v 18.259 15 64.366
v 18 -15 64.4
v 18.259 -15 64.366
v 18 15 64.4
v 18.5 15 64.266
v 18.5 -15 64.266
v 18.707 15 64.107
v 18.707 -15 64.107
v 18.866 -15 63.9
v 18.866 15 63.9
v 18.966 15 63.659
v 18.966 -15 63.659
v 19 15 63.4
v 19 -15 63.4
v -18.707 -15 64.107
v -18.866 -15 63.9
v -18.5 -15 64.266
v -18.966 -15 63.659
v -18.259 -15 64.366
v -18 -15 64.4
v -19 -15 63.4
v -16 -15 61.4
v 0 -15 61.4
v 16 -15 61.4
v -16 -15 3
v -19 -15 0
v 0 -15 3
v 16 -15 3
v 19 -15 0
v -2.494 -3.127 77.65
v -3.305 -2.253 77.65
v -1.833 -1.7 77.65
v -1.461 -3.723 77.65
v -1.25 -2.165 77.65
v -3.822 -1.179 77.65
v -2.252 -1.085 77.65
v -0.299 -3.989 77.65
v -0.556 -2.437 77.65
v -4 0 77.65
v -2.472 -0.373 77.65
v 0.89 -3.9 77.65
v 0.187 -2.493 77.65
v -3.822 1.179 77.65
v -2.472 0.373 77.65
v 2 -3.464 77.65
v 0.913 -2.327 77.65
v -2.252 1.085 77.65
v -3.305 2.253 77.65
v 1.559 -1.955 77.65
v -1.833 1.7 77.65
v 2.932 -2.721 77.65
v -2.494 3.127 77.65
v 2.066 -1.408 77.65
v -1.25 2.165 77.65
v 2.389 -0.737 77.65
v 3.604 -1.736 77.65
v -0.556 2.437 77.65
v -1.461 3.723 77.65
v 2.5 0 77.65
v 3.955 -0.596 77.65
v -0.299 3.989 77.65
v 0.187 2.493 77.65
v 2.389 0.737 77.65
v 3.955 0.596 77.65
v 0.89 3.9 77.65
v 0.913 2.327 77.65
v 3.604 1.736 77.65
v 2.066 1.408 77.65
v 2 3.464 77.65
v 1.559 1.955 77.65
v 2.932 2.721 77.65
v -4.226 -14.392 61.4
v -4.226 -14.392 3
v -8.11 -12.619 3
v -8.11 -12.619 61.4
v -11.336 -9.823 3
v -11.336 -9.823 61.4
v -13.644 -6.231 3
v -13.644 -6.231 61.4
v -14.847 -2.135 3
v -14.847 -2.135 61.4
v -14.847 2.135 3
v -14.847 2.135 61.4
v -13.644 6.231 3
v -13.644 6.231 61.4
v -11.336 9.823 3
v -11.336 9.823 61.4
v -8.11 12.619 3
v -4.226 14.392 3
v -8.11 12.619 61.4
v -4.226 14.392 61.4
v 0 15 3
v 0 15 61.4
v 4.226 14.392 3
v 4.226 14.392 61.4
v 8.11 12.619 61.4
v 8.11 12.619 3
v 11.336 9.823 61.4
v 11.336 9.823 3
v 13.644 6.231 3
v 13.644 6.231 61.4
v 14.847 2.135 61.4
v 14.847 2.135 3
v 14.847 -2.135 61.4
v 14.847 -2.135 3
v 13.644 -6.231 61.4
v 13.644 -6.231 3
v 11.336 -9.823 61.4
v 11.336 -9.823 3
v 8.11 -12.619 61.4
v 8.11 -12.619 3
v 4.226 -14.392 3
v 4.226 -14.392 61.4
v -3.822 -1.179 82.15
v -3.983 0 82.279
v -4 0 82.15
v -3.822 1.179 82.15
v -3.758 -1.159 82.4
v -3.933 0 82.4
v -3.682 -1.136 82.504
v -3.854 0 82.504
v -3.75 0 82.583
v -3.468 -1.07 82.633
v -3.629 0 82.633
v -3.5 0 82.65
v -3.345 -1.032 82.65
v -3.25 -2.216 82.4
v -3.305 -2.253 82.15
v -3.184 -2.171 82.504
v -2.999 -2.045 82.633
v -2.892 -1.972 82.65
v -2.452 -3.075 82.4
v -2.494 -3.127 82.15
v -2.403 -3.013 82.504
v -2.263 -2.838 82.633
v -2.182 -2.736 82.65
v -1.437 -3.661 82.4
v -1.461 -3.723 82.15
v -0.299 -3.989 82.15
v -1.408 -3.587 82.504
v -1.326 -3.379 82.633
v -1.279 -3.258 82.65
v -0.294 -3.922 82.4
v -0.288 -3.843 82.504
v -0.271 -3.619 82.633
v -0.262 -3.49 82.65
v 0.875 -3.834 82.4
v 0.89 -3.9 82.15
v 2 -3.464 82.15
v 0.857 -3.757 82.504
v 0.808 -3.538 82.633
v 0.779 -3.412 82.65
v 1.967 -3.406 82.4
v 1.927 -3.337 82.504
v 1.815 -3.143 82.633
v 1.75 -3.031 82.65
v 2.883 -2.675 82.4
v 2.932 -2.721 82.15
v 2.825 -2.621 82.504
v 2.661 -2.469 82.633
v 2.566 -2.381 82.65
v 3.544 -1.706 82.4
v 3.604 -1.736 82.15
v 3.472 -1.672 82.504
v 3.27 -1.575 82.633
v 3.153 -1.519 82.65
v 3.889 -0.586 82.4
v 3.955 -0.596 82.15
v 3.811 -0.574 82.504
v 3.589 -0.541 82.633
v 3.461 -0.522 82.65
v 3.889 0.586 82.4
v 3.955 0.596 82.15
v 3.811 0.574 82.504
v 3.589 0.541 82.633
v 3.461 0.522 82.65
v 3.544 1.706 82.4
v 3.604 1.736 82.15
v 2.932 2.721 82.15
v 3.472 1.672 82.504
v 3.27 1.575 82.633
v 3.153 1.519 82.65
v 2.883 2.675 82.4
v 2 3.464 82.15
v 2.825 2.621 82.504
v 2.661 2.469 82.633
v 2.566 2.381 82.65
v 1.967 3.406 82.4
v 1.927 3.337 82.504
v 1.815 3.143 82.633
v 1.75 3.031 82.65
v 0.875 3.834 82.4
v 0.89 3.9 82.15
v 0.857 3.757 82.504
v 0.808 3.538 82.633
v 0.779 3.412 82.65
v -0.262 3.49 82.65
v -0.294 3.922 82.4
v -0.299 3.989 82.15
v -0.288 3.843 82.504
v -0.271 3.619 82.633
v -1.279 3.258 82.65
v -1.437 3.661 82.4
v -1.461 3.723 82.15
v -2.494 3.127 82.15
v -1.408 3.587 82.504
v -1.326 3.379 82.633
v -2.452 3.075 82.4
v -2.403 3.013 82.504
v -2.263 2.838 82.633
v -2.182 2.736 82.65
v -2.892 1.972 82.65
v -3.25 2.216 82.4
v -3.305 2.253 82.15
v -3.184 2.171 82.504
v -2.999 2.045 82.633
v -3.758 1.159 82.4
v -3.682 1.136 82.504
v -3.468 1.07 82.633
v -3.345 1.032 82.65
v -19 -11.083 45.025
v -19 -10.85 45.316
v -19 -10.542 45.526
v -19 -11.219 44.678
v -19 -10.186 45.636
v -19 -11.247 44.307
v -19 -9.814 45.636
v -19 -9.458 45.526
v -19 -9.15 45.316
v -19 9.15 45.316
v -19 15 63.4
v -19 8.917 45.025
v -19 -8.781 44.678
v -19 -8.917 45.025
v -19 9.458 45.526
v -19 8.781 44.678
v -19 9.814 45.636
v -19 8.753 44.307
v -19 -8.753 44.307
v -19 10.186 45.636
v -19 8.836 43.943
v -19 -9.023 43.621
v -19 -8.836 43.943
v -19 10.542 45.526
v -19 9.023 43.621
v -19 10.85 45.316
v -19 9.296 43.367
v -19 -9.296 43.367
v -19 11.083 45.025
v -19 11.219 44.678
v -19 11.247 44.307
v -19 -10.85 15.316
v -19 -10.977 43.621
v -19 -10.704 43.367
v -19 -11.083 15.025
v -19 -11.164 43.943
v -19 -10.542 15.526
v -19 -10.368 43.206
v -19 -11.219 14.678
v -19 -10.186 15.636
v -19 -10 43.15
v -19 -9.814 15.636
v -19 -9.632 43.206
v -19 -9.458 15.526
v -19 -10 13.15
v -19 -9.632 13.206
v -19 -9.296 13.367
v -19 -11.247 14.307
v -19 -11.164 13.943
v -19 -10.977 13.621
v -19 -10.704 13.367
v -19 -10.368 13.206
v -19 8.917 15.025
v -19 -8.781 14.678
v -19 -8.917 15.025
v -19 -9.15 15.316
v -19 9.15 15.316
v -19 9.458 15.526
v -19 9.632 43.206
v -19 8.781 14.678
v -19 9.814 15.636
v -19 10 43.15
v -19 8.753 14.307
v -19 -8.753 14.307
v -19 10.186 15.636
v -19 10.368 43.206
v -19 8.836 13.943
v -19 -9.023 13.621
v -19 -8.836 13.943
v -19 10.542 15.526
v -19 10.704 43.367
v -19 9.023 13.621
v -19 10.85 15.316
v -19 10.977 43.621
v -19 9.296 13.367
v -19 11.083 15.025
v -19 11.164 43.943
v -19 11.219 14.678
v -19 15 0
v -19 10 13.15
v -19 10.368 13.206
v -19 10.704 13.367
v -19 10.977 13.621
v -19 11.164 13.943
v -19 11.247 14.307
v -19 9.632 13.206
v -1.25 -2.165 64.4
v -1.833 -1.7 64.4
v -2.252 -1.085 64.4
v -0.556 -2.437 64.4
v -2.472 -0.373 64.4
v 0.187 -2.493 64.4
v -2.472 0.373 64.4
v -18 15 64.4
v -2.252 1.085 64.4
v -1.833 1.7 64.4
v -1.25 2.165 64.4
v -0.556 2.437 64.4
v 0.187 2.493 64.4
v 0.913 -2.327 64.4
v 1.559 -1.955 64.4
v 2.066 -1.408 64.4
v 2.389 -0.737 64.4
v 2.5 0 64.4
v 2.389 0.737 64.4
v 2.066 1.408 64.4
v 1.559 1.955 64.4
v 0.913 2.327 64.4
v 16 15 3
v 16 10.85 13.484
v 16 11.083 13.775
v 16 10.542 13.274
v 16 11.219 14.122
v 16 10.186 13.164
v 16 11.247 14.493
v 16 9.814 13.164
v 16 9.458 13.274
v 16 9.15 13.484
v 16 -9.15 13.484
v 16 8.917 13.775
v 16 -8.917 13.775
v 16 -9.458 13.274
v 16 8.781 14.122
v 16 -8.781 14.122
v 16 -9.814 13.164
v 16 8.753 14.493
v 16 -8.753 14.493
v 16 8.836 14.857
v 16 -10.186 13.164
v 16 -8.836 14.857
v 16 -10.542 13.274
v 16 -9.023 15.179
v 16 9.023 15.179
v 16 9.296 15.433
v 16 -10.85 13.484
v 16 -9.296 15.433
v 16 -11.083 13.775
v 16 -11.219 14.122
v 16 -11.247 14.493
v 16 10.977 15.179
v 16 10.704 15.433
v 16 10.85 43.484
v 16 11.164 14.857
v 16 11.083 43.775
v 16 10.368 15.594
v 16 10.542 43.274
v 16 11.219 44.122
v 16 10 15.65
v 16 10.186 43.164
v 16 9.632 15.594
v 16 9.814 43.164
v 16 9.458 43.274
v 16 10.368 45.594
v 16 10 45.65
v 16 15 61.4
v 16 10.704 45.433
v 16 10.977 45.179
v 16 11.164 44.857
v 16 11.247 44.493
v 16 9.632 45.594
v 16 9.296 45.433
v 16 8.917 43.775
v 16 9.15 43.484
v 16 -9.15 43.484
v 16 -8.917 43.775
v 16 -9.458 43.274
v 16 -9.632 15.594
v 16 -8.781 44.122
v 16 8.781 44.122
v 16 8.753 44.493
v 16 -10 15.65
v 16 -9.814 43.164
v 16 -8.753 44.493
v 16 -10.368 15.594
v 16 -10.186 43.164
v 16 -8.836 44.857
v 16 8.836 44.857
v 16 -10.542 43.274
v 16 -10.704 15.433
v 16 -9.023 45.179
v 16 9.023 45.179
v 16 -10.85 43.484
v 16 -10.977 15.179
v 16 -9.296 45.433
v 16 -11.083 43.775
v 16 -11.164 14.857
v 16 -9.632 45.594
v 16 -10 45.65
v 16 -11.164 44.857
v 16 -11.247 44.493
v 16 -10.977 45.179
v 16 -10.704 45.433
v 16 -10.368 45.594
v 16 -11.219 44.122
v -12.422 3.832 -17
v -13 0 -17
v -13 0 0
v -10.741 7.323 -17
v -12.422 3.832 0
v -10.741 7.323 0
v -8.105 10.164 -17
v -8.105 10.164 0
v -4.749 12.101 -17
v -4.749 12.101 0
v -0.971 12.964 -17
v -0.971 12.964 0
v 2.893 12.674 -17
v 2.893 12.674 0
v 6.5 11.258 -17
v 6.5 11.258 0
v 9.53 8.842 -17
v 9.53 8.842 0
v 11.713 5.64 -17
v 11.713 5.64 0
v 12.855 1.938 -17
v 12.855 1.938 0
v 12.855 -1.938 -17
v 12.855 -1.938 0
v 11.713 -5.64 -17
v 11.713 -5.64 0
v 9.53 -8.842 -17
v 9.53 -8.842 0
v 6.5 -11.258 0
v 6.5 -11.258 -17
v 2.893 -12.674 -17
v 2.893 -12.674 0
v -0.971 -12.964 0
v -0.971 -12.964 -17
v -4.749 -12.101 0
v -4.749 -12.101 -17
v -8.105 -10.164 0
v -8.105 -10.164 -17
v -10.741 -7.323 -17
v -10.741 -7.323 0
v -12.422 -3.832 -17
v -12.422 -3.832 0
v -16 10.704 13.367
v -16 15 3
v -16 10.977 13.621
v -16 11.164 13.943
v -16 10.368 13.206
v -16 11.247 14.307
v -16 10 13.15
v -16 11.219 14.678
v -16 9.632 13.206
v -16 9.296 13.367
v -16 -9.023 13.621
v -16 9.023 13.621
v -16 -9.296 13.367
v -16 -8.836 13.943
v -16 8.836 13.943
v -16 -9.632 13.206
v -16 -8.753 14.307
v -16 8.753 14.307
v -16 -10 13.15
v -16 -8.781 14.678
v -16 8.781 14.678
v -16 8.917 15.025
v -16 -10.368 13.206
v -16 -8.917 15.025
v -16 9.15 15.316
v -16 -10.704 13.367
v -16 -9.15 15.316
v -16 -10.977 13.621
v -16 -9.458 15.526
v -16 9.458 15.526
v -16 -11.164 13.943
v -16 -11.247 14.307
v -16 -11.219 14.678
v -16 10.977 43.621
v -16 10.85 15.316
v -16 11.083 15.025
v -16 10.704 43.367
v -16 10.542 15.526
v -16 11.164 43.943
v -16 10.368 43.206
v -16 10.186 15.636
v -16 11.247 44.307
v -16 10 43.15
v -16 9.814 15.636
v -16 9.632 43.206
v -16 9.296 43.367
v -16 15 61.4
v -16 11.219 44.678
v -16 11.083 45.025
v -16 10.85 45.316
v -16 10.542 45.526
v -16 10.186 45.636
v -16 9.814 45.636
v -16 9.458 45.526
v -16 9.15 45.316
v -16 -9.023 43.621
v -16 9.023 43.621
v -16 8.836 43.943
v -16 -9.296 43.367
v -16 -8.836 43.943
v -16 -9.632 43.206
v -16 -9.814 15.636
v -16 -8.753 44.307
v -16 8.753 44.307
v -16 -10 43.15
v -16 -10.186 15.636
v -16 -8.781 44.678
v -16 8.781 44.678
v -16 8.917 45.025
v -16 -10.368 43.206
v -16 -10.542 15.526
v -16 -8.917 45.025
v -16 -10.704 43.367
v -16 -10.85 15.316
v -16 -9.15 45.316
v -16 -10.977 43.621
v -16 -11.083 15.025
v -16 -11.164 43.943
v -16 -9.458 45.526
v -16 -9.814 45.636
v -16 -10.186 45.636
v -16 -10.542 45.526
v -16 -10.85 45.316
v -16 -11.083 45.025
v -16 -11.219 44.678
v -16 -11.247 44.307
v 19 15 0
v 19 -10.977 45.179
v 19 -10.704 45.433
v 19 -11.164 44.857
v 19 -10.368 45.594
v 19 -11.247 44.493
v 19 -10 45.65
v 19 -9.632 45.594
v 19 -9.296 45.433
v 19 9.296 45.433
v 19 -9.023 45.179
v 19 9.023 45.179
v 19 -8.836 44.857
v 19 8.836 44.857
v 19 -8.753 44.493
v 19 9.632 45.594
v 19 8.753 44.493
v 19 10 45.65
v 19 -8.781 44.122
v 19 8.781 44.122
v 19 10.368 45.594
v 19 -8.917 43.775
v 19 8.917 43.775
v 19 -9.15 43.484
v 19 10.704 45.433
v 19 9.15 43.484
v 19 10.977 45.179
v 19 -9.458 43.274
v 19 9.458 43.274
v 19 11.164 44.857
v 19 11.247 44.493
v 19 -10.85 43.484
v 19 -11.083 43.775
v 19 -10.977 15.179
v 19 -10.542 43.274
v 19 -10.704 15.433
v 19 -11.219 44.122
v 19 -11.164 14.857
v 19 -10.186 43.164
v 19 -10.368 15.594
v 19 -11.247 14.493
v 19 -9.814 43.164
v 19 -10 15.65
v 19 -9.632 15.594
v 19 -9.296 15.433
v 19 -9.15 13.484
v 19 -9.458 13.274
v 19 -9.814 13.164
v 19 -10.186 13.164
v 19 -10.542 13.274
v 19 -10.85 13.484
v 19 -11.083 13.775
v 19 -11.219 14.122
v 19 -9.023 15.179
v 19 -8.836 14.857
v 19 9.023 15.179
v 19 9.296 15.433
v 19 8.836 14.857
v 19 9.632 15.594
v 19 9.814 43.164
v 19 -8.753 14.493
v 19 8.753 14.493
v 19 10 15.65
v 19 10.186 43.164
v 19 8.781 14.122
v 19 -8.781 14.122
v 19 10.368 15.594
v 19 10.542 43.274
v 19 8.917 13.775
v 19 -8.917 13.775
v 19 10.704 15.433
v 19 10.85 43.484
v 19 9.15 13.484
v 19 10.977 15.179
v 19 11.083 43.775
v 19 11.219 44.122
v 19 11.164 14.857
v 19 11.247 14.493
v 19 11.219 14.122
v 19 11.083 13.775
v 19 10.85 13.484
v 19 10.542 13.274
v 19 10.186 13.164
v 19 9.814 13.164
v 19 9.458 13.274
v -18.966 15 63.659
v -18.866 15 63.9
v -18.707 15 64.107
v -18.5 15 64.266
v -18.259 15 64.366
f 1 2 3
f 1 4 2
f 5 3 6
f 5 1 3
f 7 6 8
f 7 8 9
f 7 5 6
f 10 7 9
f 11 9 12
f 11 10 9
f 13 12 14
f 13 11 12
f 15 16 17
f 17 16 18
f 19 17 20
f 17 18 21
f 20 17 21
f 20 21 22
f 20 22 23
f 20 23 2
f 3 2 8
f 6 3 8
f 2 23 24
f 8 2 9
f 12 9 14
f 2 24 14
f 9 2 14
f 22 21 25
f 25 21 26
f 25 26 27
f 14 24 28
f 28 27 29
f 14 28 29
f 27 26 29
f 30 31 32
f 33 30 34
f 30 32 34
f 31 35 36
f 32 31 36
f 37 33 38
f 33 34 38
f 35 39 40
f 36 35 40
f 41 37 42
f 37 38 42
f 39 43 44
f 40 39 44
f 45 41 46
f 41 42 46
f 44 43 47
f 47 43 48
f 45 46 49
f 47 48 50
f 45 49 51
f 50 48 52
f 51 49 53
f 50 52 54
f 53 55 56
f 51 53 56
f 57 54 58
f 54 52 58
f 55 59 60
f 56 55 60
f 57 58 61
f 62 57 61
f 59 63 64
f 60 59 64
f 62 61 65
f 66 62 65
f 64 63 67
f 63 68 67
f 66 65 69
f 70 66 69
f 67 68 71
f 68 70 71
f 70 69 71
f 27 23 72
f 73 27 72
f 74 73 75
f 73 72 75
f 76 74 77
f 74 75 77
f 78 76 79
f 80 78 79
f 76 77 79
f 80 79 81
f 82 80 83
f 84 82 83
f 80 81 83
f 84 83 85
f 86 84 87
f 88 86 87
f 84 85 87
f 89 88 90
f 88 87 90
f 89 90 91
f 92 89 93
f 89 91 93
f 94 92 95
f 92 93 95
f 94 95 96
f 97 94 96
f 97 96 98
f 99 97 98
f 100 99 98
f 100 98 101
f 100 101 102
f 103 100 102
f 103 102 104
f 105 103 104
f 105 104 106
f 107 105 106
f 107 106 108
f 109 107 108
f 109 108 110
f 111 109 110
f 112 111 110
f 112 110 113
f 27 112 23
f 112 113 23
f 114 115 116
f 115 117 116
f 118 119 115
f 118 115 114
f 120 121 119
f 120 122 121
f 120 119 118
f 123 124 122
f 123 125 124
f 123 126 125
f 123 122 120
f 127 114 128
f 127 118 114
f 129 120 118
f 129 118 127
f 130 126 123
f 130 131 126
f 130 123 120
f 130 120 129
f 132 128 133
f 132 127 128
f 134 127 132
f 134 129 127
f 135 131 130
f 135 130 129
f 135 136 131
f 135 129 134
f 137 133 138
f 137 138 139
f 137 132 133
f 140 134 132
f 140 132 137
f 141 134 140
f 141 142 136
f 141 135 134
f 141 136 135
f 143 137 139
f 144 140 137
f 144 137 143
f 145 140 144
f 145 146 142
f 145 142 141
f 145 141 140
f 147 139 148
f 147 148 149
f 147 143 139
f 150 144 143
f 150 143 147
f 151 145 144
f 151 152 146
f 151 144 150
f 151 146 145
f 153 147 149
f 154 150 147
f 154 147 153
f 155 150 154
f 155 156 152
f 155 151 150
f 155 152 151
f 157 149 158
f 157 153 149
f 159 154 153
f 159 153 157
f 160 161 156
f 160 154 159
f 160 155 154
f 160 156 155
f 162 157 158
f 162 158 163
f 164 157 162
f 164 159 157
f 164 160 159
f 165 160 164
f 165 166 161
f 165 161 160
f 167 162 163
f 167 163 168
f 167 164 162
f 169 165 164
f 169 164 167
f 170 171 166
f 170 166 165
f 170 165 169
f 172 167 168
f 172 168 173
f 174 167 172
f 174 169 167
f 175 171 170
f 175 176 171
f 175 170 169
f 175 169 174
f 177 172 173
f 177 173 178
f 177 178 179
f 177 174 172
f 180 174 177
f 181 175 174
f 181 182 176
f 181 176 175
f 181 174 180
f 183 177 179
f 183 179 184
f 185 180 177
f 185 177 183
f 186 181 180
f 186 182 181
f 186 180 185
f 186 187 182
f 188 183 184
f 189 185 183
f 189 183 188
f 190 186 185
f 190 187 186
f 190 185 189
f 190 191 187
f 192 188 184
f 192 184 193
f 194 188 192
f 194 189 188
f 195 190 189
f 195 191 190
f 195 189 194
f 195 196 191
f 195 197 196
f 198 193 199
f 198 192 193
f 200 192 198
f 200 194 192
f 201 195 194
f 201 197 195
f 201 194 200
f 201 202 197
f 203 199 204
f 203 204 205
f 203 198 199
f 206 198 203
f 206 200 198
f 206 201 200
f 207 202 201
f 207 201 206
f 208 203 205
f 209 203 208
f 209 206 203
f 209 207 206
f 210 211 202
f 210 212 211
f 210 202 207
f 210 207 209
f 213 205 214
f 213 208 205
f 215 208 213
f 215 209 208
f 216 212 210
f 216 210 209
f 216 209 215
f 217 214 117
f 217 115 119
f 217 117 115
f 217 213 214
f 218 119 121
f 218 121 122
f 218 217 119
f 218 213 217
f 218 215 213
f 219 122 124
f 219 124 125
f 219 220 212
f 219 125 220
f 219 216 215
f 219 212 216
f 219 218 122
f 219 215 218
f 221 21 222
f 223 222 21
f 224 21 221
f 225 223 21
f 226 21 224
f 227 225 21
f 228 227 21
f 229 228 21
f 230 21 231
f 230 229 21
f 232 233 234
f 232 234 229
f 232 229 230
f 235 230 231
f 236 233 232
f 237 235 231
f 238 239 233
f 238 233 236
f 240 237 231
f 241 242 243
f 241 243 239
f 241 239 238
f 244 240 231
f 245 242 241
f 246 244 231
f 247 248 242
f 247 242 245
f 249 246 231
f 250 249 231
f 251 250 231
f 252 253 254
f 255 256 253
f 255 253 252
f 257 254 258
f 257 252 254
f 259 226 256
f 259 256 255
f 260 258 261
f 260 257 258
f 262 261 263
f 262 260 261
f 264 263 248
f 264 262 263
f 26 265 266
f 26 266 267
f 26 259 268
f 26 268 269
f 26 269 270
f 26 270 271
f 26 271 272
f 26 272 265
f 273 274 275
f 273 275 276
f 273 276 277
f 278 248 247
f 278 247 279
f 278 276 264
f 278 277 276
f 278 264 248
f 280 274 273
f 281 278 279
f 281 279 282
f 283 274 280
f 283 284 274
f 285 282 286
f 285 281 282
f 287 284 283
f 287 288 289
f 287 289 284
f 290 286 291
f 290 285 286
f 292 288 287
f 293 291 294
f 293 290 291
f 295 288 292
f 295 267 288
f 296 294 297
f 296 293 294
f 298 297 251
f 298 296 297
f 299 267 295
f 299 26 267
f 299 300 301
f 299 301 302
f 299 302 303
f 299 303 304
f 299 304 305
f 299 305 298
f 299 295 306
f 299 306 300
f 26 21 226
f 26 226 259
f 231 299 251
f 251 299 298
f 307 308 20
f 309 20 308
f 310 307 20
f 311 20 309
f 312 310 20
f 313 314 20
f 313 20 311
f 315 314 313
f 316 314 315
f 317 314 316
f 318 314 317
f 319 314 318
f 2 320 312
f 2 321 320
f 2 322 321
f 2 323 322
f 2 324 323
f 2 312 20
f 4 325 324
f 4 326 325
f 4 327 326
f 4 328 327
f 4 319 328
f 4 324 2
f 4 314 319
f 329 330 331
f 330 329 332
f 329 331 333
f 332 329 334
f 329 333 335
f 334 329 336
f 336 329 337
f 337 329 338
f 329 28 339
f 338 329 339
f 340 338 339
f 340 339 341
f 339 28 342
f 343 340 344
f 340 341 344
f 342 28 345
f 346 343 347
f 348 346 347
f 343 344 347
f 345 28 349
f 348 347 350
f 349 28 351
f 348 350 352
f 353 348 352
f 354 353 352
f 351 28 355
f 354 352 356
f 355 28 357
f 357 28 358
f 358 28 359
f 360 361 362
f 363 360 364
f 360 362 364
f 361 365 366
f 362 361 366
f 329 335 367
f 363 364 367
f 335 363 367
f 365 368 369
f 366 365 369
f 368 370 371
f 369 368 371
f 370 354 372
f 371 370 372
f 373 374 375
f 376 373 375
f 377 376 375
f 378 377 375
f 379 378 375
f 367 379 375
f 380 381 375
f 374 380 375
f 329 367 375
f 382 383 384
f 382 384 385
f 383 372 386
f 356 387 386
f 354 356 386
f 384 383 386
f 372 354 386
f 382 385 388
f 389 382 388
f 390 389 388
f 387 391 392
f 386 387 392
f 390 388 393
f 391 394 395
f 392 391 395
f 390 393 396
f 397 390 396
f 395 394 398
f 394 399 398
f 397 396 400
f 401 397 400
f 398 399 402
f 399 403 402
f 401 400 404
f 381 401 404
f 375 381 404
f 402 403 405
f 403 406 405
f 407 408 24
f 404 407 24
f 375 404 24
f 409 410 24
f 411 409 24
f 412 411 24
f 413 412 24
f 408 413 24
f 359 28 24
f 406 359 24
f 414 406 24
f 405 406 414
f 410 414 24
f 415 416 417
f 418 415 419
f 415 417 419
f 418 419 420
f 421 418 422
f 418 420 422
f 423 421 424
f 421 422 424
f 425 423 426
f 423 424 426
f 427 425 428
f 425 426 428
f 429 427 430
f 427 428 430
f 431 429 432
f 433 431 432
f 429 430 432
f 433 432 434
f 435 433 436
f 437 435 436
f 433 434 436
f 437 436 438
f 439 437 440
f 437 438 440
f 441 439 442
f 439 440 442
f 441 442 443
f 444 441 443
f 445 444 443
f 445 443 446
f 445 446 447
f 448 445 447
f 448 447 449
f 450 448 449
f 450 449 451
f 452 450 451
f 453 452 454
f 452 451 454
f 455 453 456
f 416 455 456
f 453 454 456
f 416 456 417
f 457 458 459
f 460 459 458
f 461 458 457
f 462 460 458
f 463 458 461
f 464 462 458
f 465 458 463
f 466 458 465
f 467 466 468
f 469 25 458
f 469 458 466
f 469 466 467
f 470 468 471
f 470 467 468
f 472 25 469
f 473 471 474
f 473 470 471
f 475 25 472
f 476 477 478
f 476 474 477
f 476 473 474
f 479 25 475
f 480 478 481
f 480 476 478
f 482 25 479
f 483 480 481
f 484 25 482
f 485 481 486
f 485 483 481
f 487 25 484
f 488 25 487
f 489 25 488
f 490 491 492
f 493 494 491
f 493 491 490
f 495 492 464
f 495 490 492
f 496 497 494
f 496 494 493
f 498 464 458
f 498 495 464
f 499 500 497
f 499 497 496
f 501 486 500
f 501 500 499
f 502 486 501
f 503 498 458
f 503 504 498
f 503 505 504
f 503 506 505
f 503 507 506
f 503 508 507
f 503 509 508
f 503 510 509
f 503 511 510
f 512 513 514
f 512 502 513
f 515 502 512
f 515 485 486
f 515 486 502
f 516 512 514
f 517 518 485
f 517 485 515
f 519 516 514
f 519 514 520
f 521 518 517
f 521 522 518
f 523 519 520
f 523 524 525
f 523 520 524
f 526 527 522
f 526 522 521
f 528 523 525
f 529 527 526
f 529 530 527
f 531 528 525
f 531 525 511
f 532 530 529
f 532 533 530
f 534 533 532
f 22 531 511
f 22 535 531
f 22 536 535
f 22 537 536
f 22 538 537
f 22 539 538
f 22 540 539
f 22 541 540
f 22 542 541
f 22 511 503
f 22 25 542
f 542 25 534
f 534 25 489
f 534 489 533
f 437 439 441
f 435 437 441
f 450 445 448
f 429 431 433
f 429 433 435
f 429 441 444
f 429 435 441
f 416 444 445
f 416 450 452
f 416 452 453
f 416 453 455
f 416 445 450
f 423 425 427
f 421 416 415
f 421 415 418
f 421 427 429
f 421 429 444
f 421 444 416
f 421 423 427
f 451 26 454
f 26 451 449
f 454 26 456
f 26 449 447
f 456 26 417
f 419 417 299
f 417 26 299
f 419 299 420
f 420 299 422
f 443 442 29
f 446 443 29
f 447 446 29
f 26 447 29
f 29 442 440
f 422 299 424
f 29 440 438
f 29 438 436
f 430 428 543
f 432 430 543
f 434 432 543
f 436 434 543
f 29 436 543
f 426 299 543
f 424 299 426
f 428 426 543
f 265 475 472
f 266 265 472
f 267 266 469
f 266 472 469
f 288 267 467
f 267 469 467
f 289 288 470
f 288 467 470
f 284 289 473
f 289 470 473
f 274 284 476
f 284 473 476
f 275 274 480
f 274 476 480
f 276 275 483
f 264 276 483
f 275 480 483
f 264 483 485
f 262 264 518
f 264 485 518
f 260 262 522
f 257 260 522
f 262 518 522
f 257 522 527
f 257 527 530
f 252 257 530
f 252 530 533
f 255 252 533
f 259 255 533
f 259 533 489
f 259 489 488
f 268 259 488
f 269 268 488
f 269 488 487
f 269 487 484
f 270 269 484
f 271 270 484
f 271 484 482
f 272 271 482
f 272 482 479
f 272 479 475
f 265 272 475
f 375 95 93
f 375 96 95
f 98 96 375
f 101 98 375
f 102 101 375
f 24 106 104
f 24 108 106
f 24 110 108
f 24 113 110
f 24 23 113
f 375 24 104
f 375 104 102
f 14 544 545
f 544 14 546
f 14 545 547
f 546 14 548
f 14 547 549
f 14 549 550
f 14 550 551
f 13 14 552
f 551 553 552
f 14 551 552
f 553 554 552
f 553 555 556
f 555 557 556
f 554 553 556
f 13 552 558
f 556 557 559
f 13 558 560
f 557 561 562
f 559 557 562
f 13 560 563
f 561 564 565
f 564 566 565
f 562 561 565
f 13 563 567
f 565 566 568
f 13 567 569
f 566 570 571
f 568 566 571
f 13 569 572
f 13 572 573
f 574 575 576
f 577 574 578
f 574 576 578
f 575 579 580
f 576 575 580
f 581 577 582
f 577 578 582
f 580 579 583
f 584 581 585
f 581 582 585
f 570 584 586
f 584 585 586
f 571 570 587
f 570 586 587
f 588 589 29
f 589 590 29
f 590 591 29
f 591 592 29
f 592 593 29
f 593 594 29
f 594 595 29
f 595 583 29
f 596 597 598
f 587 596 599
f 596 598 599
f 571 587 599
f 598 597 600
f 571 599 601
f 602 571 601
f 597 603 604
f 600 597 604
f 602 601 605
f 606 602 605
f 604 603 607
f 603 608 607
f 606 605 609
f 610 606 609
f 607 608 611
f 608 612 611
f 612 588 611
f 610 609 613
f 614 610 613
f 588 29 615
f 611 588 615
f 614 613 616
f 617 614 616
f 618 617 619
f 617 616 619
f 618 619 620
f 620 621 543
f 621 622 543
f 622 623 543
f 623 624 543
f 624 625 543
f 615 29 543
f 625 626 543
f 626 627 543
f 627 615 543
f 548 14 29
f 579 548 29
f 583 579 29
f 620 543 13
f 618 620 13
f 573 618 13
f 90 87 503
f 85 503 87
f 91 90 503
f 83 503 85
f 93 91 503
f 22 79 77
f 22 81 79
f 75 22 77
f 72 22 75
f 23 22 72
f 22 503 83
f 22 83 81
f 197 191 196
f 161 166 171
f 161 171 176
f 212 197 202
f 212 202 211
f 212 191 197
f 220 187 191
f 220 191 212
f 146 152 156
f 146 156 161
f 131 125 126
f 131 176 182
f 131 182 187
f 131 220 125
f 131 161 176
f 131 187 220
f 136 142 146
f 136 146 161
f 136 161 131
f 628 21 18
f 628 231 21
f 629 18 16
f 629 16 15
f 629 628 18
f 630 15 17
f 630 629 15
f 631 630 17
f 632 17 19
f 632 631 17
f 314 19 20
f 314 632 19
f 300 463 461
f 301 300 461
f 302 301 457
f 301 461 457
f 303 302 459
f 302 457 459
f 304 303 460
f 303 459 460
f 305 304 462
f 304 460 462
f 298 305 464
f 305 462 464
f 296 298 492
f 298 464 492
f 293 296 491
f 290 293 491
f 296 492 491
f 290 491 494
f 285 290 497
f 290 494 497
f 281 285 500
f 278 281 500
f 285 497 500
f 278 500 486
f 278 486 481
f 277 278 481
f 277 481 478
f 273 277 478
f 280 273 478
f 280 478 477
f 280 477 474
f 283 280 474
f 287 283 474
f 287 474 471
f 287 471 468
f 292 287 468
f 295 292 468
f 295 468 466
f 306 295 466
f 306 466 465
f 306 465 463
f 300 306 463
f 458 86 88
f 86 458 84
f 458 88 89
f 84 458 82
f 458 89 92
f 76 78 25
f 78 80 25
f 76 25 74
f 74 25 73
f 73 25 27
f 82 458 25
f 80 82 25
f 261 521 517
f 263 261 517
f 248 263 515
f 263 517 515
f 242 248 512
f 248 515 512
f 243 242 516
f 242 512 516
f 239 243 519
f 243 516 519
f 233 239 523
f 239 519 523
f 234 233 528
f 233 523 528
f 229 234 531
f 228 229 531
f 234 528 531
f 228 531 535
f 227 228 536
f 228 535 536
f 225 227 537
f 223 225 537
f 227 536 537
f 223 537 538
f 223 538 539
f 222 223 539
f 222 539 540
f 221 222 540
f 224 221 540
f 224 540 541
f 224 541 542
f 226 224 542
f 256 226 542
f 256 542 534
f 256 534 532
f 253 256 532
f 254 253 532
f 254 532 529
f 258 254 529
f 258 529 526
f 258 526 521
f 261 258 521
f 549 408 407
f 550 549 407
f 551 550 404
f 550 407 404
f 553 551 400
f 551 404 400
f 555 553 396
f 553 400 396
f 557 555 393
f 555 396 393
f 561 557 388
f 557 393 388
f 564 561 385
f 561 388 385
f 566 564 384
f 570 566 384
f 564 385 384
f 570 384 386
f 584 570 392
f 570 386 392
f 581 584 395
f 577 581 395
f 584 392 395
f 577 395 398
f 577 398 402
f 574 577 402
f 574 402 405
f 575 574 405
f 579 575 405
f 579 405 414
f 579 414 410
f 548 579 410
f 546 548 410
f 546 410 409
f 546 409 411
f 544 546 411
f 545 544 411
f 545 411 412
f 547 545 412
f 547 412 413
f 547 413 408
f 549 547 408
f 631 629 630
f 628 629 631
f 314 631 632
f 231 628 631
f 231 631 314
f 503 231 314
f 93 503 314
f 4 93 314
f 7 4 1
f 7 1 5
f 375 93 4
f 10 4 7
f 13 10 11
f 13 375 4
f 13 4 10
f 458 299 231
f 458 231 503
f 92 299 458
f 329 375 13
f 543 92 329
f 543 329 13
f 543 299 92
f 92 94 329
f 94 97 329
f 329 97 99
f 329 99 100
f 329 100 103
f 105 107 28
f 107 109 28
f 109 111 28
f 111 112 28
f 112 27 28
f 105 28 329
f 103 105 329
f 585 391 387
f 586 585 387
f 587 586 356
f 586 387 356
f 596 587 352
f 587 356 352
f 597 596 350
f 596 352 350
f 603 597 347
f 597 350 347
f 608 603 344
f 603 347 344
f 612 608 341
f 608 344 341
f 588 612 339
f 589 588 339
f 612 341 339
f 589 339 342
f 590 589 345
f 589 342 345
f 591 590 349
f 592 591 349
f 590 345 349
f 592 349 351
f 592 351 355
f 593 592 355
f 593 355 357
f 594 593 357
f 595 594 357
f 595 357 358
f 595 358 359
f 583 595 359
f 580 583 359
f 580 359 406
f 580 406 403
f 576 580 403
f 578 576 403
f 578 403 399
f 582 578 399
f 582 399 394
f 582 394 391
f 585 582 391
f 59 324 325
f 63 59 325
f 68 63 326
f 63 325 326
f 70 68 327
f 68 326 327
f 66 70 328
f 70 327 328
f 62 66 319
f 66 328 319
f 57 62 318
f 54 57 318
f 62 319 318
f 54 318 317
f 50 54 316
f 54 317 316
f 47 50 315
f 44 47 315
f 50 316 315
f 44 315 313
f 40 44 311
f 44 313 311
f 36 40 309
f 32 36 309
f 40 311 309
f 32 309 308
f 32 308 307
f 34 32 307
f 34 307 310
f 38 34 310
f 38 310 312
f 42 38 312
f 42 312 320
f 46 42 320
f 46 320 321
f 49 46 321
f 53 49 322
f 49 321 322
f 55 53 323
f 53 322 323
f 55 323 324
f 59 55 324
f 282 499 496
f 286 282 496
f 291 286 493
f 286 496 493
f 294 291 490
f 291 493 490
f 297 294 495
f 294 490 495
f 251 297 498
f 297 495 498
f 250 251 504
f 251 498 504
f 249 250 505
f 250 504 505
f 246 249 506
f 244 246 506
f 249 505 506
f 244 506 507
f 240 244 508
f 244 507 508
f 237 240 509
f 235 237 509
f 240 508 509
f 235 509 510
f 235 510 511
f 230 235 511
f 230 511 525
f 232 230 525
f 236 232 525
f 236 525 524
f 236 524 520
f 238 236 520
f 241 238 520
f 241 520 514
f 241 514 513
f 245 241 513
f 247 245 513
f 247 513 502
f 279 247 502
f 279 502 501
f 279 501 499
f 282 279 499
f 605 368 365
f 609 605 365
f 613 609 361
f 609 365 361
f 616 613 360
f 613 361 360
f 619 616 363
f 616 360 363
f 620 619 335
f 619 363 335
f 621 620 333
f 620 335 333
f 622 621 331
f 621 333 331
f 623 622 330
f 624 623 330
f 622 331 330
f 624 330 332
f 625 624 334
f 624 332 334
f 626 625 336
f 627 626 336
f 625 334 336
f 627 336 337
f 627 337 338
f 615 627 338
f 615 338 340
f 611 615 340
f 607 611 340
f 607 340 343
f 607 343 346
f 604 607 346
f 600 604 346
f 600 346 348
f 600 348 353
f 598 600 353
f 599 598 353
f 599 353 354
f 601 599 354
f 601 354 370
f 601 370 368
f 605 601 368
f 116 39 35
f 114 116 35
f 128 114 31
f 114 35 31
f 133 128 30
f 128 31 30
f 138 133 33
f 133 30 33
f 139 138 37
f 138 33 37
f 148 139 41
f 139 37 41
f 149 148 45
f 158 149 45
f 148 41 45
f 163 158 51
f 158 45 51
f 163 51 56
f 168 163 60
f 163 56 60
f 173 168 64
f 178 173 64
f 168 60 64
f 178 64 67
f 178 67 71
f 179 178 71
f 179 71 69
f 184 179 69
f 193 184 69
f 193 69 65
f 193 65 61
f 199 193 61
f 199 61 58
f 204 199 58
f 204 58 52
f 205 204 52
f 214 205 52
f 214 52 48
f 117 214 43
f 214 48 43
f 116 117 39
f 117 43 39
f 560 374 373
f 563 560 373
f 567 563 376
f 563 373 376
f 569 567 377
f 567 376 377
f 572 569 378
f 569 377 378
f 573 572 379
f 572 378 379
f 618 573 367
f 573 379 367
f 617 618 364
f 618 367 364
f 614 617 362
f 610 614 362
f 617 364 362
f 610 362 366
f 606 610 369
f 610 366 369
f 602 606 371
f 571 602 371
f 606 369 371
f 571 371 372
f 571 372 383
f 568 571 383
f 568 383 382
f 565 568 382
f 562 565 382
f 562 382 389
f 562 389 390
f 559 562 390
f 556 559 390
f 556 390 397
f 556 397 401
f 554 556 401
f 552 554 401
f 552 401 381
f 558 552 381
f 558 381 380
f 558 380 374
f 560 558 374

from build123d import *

# Parameters (mm, degrees)
SKETCH1_W                 = 38
SKETCH1_H                 = 30
BOSS_EXTRUDE1_DEPTH       = 64.4
SKETCH3_R                 = 13
BOSS_EXTRUDE3_DEPTH       = 17
SKETCH2_R                 = 4
BOSS_EXTRUDE4_DEPTH       = 18.25
SKETCH16_W                = 32
SKETCH16_H                = 58.4
CUT_EXTRUDE1_DEPTH        = 90.955669638
SKETCH17_R                = 15
BOSS_EXTRUDE9_DEPTH       = 58.4
FILLET1_R                 = 1
M3X0_5_TAPPED_HOLE1_D     = 2.5
M3X0_5_TAPPED_HOLE1_DEPTH = 3
M3X0_5_TAPPED_HOLE2_D     = 2.5
M3X0_5_TAPPED_HOLE2_DEPTH = 3
SKETCH22_R                = 4
SKETCH22_R_2              = 2.5
CUT_EXTRUDE2_DEPTH        = 13.25
FILLET2_R                 = 0.5


with BuildPart() as part:
    # Sketch1 → Boss-Extrude1 (new body)
    with BuildSketch(Plane.XY):
        Rectangle(SKETCH1_W, SKETCH1_H)
    extrude(amount=BOSS_EXTRUDE1_DEPTH)

    # Sketch3 → Boss-Extrude3 (add)
    with BuildSketch(Plane(origin=(0, 0, 0), x_dir=(-1, 0, 0), z_dir=(0, 0, -1))):
        Circle(SKETCH3_R)
    extrude(amount=BOSS_EXTRUDE3_DEPTH)

    # Sketch2 → Boss-Extrude4 (add)
    with BuildSketch(Plane.XY.offset(64.4)):
        with Locations(Location((0, 0, 0), (0, 0, 180))):
            Circle(SKETCH2_R)
    extrude(amount=BOSS_EXTRUDE4_DEPTH)

    # Sketch16 → Cut-Extrude1 (cut, through all)
    with BuildSketch(Plane.XZ.offset(15)):
        with Locations((0, 32.2)):
            Rectangle(SKETCH16_W, SKETCH16_H)
    extrude(amount=-CUT_EXTRUDE1_DEPTH, mode=Mode.SUBTRACT)

    # Sketch17 → Boss-Extrude9 (add)
    with BuildSketch(Plane(origin=(0, 0, 61.4), x_dir=(-1, 0, 0), z_dir=(0, 0, -1))):
        with Locations(Location((0, 0, 0), (0, 0, 270))):
            Circle(SKETCH17_R)
    extrude(amount=BOSS_EXTRUDE9_DEPTH)

    # Fillet1
    fillet1_edges = [part.edges().sort_by_distance(p)[0] for p in [
        (-19, 0, 64.4),
        (19, 0, 64.4),
    ]]
    fillet(fillet1_edges, radius=FILLET1_R)

    # M3x0.5 Tapped Hole1
    with Locations(Plane.ZY.offset(19)):
        with Locations((14.4, -10), (44.4, -10), (44.4, 10), (14.4, 10)):
            Hole(M3X0_5_TAPPED_HOLE1_D / 2, depth=M3X0_5_TAPPED_HOLE1_DEPTH)

    # M3x0.5 Tapped Hole2
    with Locations(Plane(origin=(19, 0, 0), x_dir=(0, 0, -1), z_dir=(1, 0, 0))):
        with Locations((-14.4, 10), (-14.4, -10), (-44.4, -10), (-44.4, 10)):
            Hole(M3X0_5_TAPPED_HOLE2_D / 2, depth=M3X0_5_TAPPED_HOLE2_DEPTH)

    # Sketch22 → Cut-Extrude2 (cut)
    with BuildSketch(Plane.XY.offset(64.4)):
        Circle(SKETCH22_R)
        Circle(SKETCH22_R_2, mode=Mode.SUBTRACT)
    extrude(amount=CUT_EXTRUDE2_DEPTH, mode=Mode.SUBTRACT)

    # Fillet2
    fillet2_edges = [part.edges().sort_by_distance(p)[0] for p in [
        (4, 0, 82.65),
    ]]
    fillet(fillet2_edges, radius=FILLET2_R)


solid = part.part
